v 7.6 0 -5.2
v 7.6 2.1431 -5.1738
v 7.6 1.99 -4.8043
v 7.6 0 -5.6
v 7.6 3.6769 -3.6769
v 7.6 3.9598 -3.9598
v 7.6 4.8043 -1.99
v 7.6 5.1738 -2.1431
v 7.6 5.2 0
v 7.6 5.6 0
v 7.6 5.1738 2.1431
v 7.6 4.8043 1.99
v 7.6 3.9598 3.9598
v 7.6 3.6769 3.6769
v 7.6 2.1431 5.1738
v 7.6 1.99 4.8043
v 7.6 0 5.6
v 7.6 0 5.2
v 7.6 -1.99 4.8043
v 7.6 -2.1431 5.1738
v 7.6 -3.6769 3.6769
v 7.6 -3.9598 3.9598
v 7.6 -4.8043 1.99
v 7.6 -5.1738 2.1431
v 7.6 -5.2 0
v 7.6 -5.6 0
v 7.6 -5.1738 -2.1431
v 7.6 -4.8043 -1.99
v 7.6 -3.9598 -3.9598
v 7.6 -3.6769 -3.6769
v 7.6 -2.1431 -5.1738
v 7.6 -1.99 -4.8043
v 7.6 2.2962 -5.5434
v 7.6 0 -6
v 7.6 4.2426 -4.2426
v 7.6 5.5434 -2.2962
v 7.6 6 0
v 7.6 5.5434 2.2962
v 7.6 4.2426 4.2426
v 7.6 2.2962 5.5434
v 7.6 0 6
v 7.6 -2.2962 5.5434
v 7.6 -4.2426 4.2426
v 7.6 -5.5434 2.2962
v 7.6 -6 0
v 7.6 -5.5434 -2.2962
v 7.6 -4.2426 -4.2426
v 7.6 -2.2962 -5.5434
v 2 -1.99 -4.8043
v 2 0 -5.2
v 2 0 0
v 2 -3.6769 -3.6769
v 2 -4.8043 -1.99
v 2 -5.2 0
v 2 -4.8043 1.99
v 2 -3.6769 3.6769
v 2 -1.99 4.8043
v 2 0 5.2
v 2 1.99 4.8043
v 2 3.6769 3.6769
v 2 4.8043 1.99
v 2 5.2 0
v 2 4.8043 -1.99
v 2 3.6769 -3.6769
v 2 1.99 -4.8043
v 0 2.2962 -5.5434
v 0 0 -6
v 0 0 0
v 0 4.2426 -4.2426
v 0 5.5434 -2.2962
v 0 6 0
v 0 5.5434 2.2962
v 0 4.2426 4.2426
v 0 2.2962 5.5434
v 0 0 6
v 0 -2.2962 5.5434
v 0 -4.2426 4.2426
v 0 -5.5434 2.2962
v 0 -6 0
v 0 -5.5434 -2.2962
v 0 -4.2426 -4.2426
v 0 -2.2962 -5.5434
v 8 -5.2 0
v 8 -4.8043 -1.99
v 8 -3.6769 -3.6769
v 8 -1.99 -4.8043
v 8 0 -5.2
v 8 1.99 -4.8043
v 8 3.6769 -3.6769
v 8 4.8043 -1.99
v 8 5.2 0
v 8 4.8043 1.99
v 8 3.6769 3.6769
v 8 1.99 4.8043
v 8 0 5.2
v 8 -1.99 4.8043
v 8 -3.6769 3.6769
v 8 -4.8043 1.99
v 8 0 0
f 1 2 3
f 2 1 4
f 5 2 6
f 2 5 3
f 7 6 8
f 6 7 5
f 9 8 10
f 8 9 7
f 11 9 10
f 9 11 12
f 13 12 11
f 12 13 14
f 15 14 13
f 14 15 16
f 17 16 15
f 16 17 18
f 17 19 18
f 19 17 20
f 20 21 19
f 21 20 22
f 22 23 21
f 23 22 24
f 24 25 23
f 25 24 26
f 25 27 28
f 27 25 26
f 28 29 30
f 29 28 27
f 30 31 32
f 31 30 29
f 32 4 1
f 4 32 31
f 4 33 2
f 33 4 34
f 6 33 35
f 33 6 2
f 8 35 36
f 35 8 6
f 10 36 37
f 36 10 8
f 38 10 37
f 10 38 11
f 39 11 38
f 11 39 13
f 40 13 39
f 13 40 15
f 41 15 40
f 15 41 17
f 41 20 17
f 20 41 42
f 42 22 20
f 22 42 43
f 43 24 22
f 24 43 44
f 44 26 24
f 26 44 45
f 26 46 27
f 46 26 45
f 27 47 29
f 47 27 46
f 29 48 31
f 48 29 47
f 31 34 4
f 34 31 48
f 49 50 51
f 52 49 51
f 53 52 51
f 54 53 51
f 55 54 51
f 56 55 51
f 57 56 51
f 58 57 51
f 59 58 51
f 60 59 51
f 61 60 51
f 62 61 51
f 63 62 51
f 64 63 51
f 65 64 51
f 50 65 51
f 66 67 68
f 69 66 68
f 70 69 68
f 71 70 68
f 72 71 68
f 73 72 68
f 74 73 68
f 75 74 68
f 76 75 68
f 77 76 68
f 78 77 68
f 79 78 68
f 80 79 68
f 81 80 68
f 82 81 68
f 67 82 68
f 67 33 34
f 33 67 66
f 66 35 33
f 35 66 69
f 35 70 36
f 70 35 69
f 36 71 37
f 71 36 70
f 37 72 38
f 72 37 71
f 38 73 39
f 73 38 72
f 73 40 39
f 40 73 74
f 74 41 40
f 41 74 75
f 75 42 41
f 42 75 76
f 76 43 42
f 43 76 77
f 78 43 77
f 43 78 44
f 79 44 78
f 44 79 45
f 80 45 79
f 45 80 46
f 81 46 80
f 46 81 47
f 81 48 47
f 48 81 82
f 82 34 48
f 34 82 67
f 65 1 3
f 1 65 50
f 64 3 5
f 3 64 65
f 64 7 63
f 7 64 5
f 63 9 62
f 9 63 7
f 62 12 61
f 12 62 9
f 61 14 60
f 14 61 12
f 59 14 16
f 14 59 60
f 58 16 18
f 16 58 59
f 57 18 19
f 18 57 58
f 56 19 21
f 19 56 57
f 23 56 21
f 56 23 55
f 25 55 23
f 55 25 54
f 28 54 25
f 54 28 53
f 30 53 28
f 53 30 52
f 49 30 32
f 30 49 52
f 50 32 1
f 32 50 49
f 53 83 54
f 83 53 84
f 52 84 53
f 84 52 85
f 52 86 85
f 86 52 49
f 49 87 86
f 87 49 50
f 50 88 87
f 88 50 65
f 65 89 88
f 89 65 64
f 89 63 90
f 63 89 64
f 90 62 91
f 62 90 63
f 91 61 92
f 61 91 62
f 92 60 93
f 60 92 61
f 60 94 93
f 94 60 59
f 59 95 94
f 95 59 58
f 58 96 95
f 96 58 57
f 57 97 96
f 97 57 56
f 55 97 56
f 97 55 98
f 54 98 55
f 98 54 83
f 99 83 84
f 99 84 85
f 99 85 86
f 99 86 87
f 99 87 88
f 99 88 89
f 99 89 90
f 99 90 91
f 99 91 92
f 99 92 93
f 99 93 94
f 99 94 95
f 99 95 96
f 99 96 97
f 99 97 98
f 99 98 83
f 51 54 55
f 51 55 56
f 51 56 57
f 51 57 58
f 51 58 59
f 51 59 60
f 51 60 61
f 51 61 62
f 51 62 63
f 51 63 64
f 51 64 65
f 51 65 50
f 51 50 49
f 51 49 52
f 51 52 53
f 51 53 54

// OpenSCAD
// file: ../../p/stud3.scad
use <../lib.scad>
use <4-4cyli.scad>
use <4-4disc.scad>
use <4-4edge.scad>
$fa=1; $fs=0.2;
function ldraw_lib__stud3(realsolid=false) = realsolid ? 
    [openscad(translate([0,0,-eps()], o=cylinder(4+eps(), r=4)),2)] : [
// 0 Stud Tube Solid
// 0 Name: stud3.dat
// 0 Author: James Jessiman
// 0 !LDRAW_ORG Primitive UPDATE 2012-01
// 0 !LICENSE Licensed under CC BY 2.0 and CC BY 4.0 : see CAreadme.txt
// 
// 0 BFC CERTIFY CCW
  [0,"BFC","CERTIFY"],
  [0,"BFC","CCW"],
// 
// 0 !HISTORY 2002-04-04 [sbliss] Modified for BFC compliance
// 0 !HISTORY 2002-04-25 [PTadmin] Official Update 2002-02
// 0 !HISTORY 2007-06-24 [PTadmin] Header formatted for Contributor Agreement
// 0 !HISTORY 2008-07-01 [PTadmin] Official Update 2008-01
// 0 !HISTORY 2012-02-16 [Philo] Changed to CCW
// 0 !HISTORY 2012-03-30 [PTadmin] Official Update 2012-01
// 
// 
// 1 16 0 -4 0 4 0 0 0 1 0 0 0 4 4-4edge.dat
  [1,16,0,-4,0,4,0,0,0,1,0,0,0,4, ldraw_lib__4_4edge(realsolid)],
// 1 16 0 0 0 4 0 0 0 1 0 0 0 4 4-4edge.dat
  [1,16,0,0,0,4,0,0,0,1,0,0,0,4, ldraw_lib__4_4edge(realsolid)],
// 1 16 0 -4 0 4 0 0 0 1 0 0 0 4 4-4disc.dat
  [1,16,0,-4,0,4,0,0,0,1,0,0,0,4, ldraw_lib__4_4disc(realsolid)],
// 1 16 0 -4 0 4 0 0 0 4 0 0 0 4 4-4cyli.dat
  [1,16,0,-4,0,4,0,0,0,4,0,0,0,4, ldraw_lib__4_4cyli(realsolid)],
];
module ldraw_lib__stud3(step=0, col=false, unit=2/5, alt=false, line=0.2, solid=!$preview)
    makepoly(ldraw_lib__stud3(solid), step=step, col=col, unit=unit, alt=alt, line=line, solid=solid);
ldraw_lib__stud3(line=0.2);
// file: ../../p/stud.scad
use <../lib.scad>
use <4-4cyli.scad>
use <4-4disc.scad>
use <4-4edge.scad>
$fa=1; $fs=0.2;
function ldraw_lib__stud(realsolid=false) = realsolid ? 
    [openscad(translate([0,0,-eps()], o=cylinder(4+eps(), r=6)),2)] : [
// 0 Stud
// 0 Name: stud.dat
// 0 Author: James Jessiman
// 0 !LDRAW_ORG Primitive UPDATE 2012-01
// 0 !LICENSE Licensed under CC BY 2.0 and CC BY 4.0 : see CAreadme.txt
// 
// 0 BFC CERTIFY CCW
  [0,"BFC","CERTIFY"],
  [0,"BFC","CCW"],
// 
// 0 !HISTORY 2002-04-04 [sbliss] Modified for BFC compliance
// 0 !HISTORY 2002-04-25 [PTadmin] Official Update 2002-02
// 0 !HISTORY 2007-06-24 [PTadmin] Header formatted for Contributor Agreement
// 0 !HISTORY 2008-07-01 [PTadmin] Official Update 2008-01
// 0 !HISTORY 2012-02-16 [Philo] Changed to CCW
// 0 !HISTORY 2012-03-30 [PTadmin] Official Update 2012-01
// 
// 
// 1 16 0 0 0 6 0 0 0 1 0 0 0 6 4-4edge.dat
  [1,16,0,0,0,6,0,0,0,1,0,0,0,6, ldraw_lib__4_4edge(realsolid)],
// 1 16 0 -4 0 6 0 0 0 1 0 0 0 6 4-4edge.dat
  [1,16,0,-4,0,6,0,0,0,1,0,0,0,6, ldraw_lib__4_4edge(realsolid)],
// 1 16 0 0 0 6 0 0 0 -4 0 0 0 6 4-4cyli.dat
  [1,16,0,0,0,6,0,0,0,-4,0,0,0,6, ldraw_lib__4_4cyli(realsolid)],
// 1 16 0 -4 0 6 0 0 0 1 0 0 0 6 4-4disc.dat
  [1,16,0,-4,0,6,0,0,0,1,0,0,0,6, ldraw_lib__4_4disc(realsolid)],
];
module ldraw_lib__stud(step=0, col=false, unit=2/5, alt=false, line=0.2, solid=!$preview)
    makepoly(ldraw_lib__stud(solid), step=step, col=col, unit=unit, alt=alt, line=line, solid=solid);
ldraw_lib__stud(line=0.2);
// file: ../../p/box5.scad
use <../lib.scad>
$fa=1; $fs=0.2;
function ldraw_lib__box5(realsolid=false) = [
// 0 Box with 5 Faces and All Edges
// 0 Name: box5.dat
// 0 Author: James Jessiman
// 0 !LDRAW_ORG Primitive UPDATE 2012-01
// 0 !LICENSE Licensed under CC BY 2.0 and CC BY 4.0 : see CAreadme.txt
// 
// 0 BFC CERTIFY CCW
  [0,"BFC","CERTIFY"],
  [0,"BFC","CCW"],
// 
// 0 !HISTORY 2002-04-03 [sbliss] Modified for BFC compliance
// 0 !HISTORY 2002-04-25 [PTadmin] Official Update 2002-02
// 0 !HISTORY 2007-06-24 [PTadmin] Header formatted for Contributor Agreement
// 0 !HISTORY 2008-07-01 [PTadmin] Official Update 2008-01
// 0 !HISTORY 2012-02-16 [Philo] Changed to CCW
// 0 !HISTORY 2012-03-30 [PTadmin] Official Update 2012-01
// 
// 
// 2 24 1 1 1 -1 1 1
  [2,24,1,1,1,-1,1,1],
// 2 24 -1 1 1 -1 1 -1
  [2,24,-1,1,1,-1,1,-1],
// 2 24 -1 1 -1 1 1 -1
  [2,24,-1,1,-1,1,1,-1],
// 2 24 1 1 -1 1 1 1
  [2,24,1,1,-1,1,1,1],
// 2 24 1 0 1 -1 0 1
  [2,24,1,0,1,-1,0,1],
// 2 24 -1 0 1 -1 0 -1
  [2,24,-1,0,1,-1,0,-1],
// 2 24 -1 0 -1 1 0 -1
  [2,24,-1,0,-1,1,0,-1],
// 2 24 1 0 -1 1 0 1
  [2,24,1,0,-1,1,0,1],
// 2 24 1 0 1 1 1 1
  [2,24,1,0,1,1,1,1],
// 2 24 -1 0 1 -1 1 1
  [2,24,-1,0,1,-1,1,1],
// 2 24 1 0 -1 1 1 -1
  [2,24,1,0,-1,1,1,-1],
// 2 24 -1 0 -1 -1 1 -1
  [2,24,-1,0,-1,-1,1,-1],
// 4 16 -1 1 1 1 1 1 1 1 -1 -1 1 -1
  [4,16,-1,1,1,1,1,1,1,1,-1,-1,1,-1],
// 4 16 -1 1 1 -1 0 1 1 0 1 1 1 1
  [4,16,-1,1,1,-1,0,1,1,0,1,1,1,1],
// 4 16 -1 1 -1 -1 0 -1 -1 0 1 -1 1 1
  [4,16,-1,1,-1,-1,0,-1,-1,0,1,-1,1,1],
// 4 16 1 1 -1 1 0 -1 -1 0 -1 -1 1 -1
  [4,16,1,1,-1,1,0,-1,-1,0,-1,-1,1,-1],
// 4 16 1 1 1 1 0 1 1 0 -1 1 1 -1
  [4,16,1,1,1,1,0,1,1,0,-1,1,1,-1],
];
module ldraw_lib__box5(step=0, col=false, unit=2/5, alt=false, line=0.2, solid=!$preview)
    makepoly(ldraw_lib__box5(solid), step=step, col=col, unit=unit, alt=alt, line=line, solid=solid);
ldraw_lib__box5(line=0.2);
// file: ../../p/box4t.scad
use <../lib.scad>
$fa=1; $fs=0.2;
function ldraw_lib__box4t(realsolid=false) = [
// 0 Box with 4 Adjacent Faces and All Edges
// 0 Name: box4t.dat
// 0 Author: Tore Eriksson [Tore_Eriksson]
// 0 !LDRAW_ORG Primitive UPDATE 2003-02
// 0 !LICENSE Licensed under CC BY 2.0 and CC BY 4.0 : see CAreadme.txt
// 
// 0 BFC CERTIFY CCW
  [0,"BFC","CERTIFY"],
  [0,"BFC","CCW"],
// 
// 0 !HISTORY 1997-09-29 [PTadmin] Official Update 1997-15
// 0 !HISTORY 2002-08-31 [izanette] Modified with WINDZ for BFC compliance
// 0 !HISTORY 2003-08-01 [PTadmin] Official Update 2003-02
// 0 !HISTORY 2007-06-24 [PTadmin] Header formatted for Contributor Agreement
// 0 !HISTORY 2008-07-01 [PTadmin] Official Update 2008-01
// 
// 
// 2 24 1 1 1 -1 1 1
  [2,24,1,1,1,-1,1,1],
// 2 24 -1 1 1 -1 1 -1
  [2,24,-1,1,1,-1,1,-1],
// 2 24 -1 1 -1 1 1 -1
  [2,24,-1,1,-1,1,1,-1],
// 2 24 1 1 -1 1 1 1
  [2,24,1,1,-1,1,1,1],
// 2 24 1 0 1 -1 0 1
  [2,24,1,0,1,-1,0,1],
// 2 24 -1 0 1 -1 0 -1
  [2,24,-1,0,1,-1,0,-1],
// 2 24 -1 0 -1 1 0 -1
  [2,24,-1,0,-1,1,0,-1],
// 2 24 1 0 -1 1 0 1
  [2,24,1,0,-1,1,0,1],
// 2 24 1 0 1 1 1 1
  [2,24,1,0,1,1,1,1],
// 2 24 -1 0 1 -1 1 1
  [2,24,-1,0,1,-1,1,1],
// 2 24 1 0 -1 1 1 -1
  [2,24,1,0,-1,1,1,-1],
// 2 24 -1 0 -1 -1 1 -1
  [2,24,-1,0,-1,-1,1,-1],
// 4 16 1 1 1 1 1 -1 -1 1 -1 -1 1 1
  [4,16,1,1,1,1,1,-1,-1,1,-1,-1,1,1],
// 4 16 1 1 1 -1 1 1 -1 0 1 1 0 1
  [4,16,1,1,1,-1,1,1,-1,0,1,1,0,1],
// 4 16 -1 1 1 -1 1 -1 -1 0 -1 -1 0 1
  [4,16,-1,1,1,-1,1,-1,-1,0,-1,-1,0,1],
// 0 4 16 -1 1 -1 -1 0 -1 1 0 -1 1 1 -1
// 4 16 1 1 -1 1 1 1 1 0 1 1 0 -1
  [4,16,1,1,-1,1,1,1,1,0,1,1,0,-1],
// 0
];
module ldraw_lib__box4t(step=0, col=false, unit=2/5, alt=false, line=0.2, solid=!$preview)
    makepoly(ldraw_lib__box4t(solid), step=step, col=col, unit=unit, alt=alt, line=line, solid=solid);
ldraw_lib__box4t(line=0.2);
// file: 3004s01.scad
use <../../lib.scad>
use <../../p/box4t.scad>
use <../../p/box5.scad>
use <../../p/stud.scad>
use <../../p/stud3.scad>
$fa=1; $fs=0.2;
function ldraw_lib__s__3004s01(realsolid=false) = [
// 0 ~Brick  1 x  2 without Front Face
// 0 Name: s\3004s01.dat
// 0 Author: James Jessiman
// 0 !LDRAW_ORG Subpart UPDATE 2003-03
// 0 !LICENSE Licensed under CC BY 2.0 and CC BY 4.0 : see CAreadme.txt
// 
// 0 BFC CERTIFY CCW
  [0,"BFC","CERTIFY"],
  [0,"BFC","CCW"],
// 
// 0 !HISTORY 2003-09-07 [jriley] Subfiling, BFC
// 0 !HISTORY 2003-12-19 [PTadmin] Official Update 2003-03
// 0 !HISTORY 2007-08-29 [PTadmin] Header formatted for Contributor Agreement
// 0 !HISTORY 2008-07-01 [PTadmin] Official Update 2008-01
// 
// 
// 1 16 0 4 0 1 0 0 0 -5 0 0 0 1 stud3.dat
  [1,16,0,4,0,1,0,0,0,-5,0,0,0,1, ldraw_lib__stud3(realsolid)],
// 0 BFC INVERTNEXT
  [0,"BFC","INVERTNEXT"],
// 1 16 0 24 0 16 0 0 0 -20 0 0 0 6 box5.dat
  [1,16,0,24,0,16,0,0,0,-20,0,0,0,6, ldraw_lib__box5(realsolid)],
// 4 16 20 24 10 16 24 6 -16 24 6 -20 24 10
  [4,16,20,24,10,16,24,6,-16,24,6,-20,24,10],
// 4 16 -20 24 10 -16 24 6 -16 24 -6 -20 24 -10
  [4,16,-20,24,10,-16,24,6,-16,24,-6,-20,24,-10],
// 4 16 -20 24 -10 -16 24 -6 16 24 -6 20 24 -10
  [4,16,-20,24,-10,-16,24,-6,16,24,-6,20,24,-10],
// 4 16 20 24 -10 16 24 -6 16 24 6 20 24 10
  [4,16,20,24,-10,16,24,-6,16,24,6,20,24,10],
// 1 16 0 24 0 20 0 0 0 -24 0 0 0 10 box4t.dat
  [1,16,0,24,0,20,0,0,0,-24,0,0,0,10, ldraw_lib__box4t(realsolid)],
// 1 16 10 0 0 1 0 0 0 1 0 0 0 1 stud.dat
  [1,16,10,0,0,1,0,0,0,1,0,0,0,1, ldraw_lib__stud(realsolid)],
// 1 16 -10 0 0 1 0 0 0 1 0 0 0 1 stud.dat
  [1,16,-10,0,0,1,0,0,0,1,0,0,0,1, ldraw_lib__stud(realsolid)],
// 0
];
module ldraw_lib__s__3004s01(step=0, col=false, unit=2/5, alt=false, line=0.2, solid=!$preview)
    makepoly(ldraw_lib__s__3004s01(solid), step=step, col=col, unit=unit, alt=alt, line=line, solid=solid);
ldraw_lib__s__3004s01(line=0.2);
// file: ../u9044.scad
use <../lib.scad>
use <../p/4-4cyli.scad>
use <../p/4-4disc.scad>
use <../p/4-4edge.scad>
$fa=1; $fs=0.2;
function ldraw_lib__u9044(realsolid=false) = [
// 0 ~Magnet Cylindrical  1.3 x  1.3
// 0 Name: u9044.dat
// 0 Author: Chris Dee [cwdee]
// 0 !LDRAW_ORG Part UPDATE 2012-01
// 0 !LICENSE Licensed under CC BY 2.0 and CC BY 4.0 : see CAreadme.txt
// 
// 0 BFC CERTIFY CW
  [0,"BFC","CERTIFY"],
  [0,"BFC","CW"],
// 
// 0 !CMDLINE -c493
// 
// 0 !HISTORY 2011-12-18 [Steffen] added cmdline for new magnet material 493
// 0 !HISTORY 2012-03-30 [PTadmin] Official Update 2012-01
// 
// 
// 1 16 0 0 -7.5 13 0 0 0 0 13 0 15 0 4-4cyli.dat
  [1,16,0,0,-7.5,13,0,0,0,0,13,0,15,0, ldraw_lib__4_4cyli(realsolid)],
// 1 16 0 0 7.5 13 0 0 0 0 13 0 1 0 4-4edge.dat
  [1,16,0,0,7.5,13,0,0,0,0,13,0,1,0, ldraw_lib__4_4edge(realsolid)],
// 1 16 0 0 7.5 13 0 0 0 0 13 0 -1 0 4-4disc.dat
  [1,16,0,0,7.5,13,0,0,0,0,13,0,-1,0, ldraw_lib__4_4disc(realsolid)],
// 1 16 0 0 -7.5 13 0 0 0 0 -13 0 1 0 4-4edge.dat
  [1,16,0,0,-7.5,13,0,0,0,0,-13,0,1,0, ldraw_lib__4_4edge(realsolid)],
// 1 16 0 0 -7.5 13 0 0 0 0 -13 0 1 0 4-4disc.dat
  [1,16,0,0,-7.5,13,0,0,0,0,-13,0,1,0, ldraw_lib__4_4disc(realsolid)],
];
module ldraw_lib__u9044(step=0, col=false, unit=2/5, alt=false, line=0.2, solid=!$preview)
    makepoly(ldraw_lib__u9044(solid), step=step, col=col, unit=unit, alt=alt, line=line, solid=solid);
ldraw_lib__u9044(line=0.2);
// file: ../../p/4-4rin14.scad
use <../lib.scad>
$fa=1; $fs=0.2;
function ldraw_lib__4_4rin14(realsolid=false) = [
// 0 Ring 14 x 1.0
// 0 Name: 4-4rin14.dat
// 0 Author: John Riley [jriley]
// 0 !LDRAW_ORG Primitive UPDATE 2003-03
// 0 !LICENSE Licensed under CC BY 2.0 and CC BY 4.0 : see CAreadme.txt
// 
// 0 BFC CERTIFY CCW
  [0,"BFC","CERTIFY"],
  [0,"BFC","CCW"],
// 
// 0 !HISTORY 2003-12-19 [PTadmin] Official Update 2003-03
// 0 !HISTORY 2007-06-24 [PTadmin] Header formatted for Contributor Agreement
// 0 !HISTORY 2008-07-01 [PTadmin] Official Update 2008-01
// 
// 
// 4 16 14 0 0 15 0 0 13.8585 0 5.7405 12.9346 0 5.3578
  [4,16,14,0,0,15,0,0,13.8585,0,5.7405,12.9346,0,5.3578],
// 4 16 12.9346 0 5.3578 13.8585 0 5.7405 10.6065 0 10.6065 9.8994 0 9.8994
  [4,16,12.9346,0,5.3578,13.8585,0,5.7405,10.6065,0,10.6065,9.8994,0,9.8994],
// 4 16 9.8994 0 9.8994 10.6065 0 10.6065 5.7405 0 13.8585 5.3578 0 12.9346
  [4,16,9.8994,0,9.8994,10.6065,0,10.6065,5.7405,0,13.8585,5.3578,0,12.9346],
// 4 16 5.3578 0 12.9346 5.7405 0 13.8585 0 0 15 0 0 14
  [4,16,5.3578,0,12.9346,5.7405,0,13.8585,0,0,15,0,0,14],
// 4 16 0 0 14 0 0 15 -5.7405 0 13.8585 -5.3578 0 12.9346
  [4,16,0,0,14,0,0,15,-5.7405,0,13.8585,-5.3578,0,12.9346],
// 4 16 -5.3578 0 12.9346 -5.7405 0 13.8585 -10.6065 0 10.6065 -9.8994 0 9.8994
  [4,16,-5.3578,0,12.9346,-5.7405,0,13.8585,-10.6065,0,10.6065,-9.8994,0,9.8994],
// 4 16 -9.8994 0 9.8994 -10.6065 0 10.6065 -13.8585 0 5.7405 -12.9346 0 5.3578
  [4,16,-9.8994,0,9.8994,-10.6065,0,10.6065,-13.8585,0,5.7405,-12.9346,0,5.3578],
// 4 16 -12.9346 0 5.3578 -13.8585 0 5.7405 -15 0 0 -14 0 0
  [4,16,-12.9346,0,5.3578,-13.8585,0,5.7405,-15,0,0,-14,0,0],
// 4 16 -14 0 0 -15 0 0 -13.8585 0 -5.7405 -12.9346 0 -5.3578
  [4,16,-14,0,0,-15,0,0,-13.8585,0,-5.7405,-12.9346,0,-5.3578],
// 4 16 -12.9346 0 -5.3578 -13.8585 0 -5.7405 -10.6065 0 -10.6065 -9.8994 0 -9.8994
  [4,16,-12.9346,0,-5.3578,-13.8585,0,-5.7405,-10.6065,0,-10.6065,-9.8994,0,-9.8994],
// 4 16 -9.8994 0 -9.8994 -10.6065 0 -10.6065 -5.7405 0 -13.8585 -5.3578 0 -12.9346
  [4,16,-9.8994,0,-9.8994,-10.6065,0,-10.6065,-5.7405,0,-13.8585,-5.3578,0,-12.9346],
// 4 16 -5.3578 0 -12.9346 -5.7405 0 -13.8585 0 0 -15 0 0 -14
  [4,16,-5.3578,0,-12.9346,-5.7405,0,-13.8585,0,0,-15,0,0,-14],
// 4 16 0 0 -14 0 0 -15 5.7405 0 -13.8585 5.3578 0 -12.9346
  [4,16,0,0,-14,0,0,-15,5.7405,0,-13.8585,5.3578,0,-12.9346],
// 4 16 5.3578 0 -12.9346 5.7405 0 -13.8585 10.6065 0 -10.6065 9.8994 0 -9.8994
  [4,16,5.3578,0,-12.9346,5.7405,0,-13.8585,10.6065,0,-10.6065,9.8994,0,-9.8994],
// 4 16 9.8994 0 -9.8994 10.6065 0 -10.6065 13.8585 0 -5.7405 12.9346 0 -5.3578
  [4,16,9.8994,0,-9.8994,10.6065,0,-10.6065,13.8585,0,-5.7405,12.9346,0,-5.3578],
// 4 16 12.9346 0 -5.3578 13.8585 0 -5.7405 15 0 0 14 0 0
  [4,16,12.9346,0,-5.3578,13.8585,0,-5.7405,15,0,0,14,0,0],
// 0
// 
];
module ldraw_lib__4_4rin14(step=0, col=false, unit=2/5, alt=false, line=0.2, solid=!$preview)
    makepoly(ldraw_lib__4_4rin14(solid), step=step, col=col, unit=unit, alt=alt, line=line, solid=solid);
ldraw_lib__4_4rin14(line=0.2);
// file: ../../p/4-4rin13.scad
use <../lib.scad>
$fa=1; $fs=0.2;
function ldraw_lib__4_4rin13(realsolid=false) = [
// 0 Ring 13 x 1.0
// 0 Name: 4-4rin13.dat
// 0 Author: John Riley [jriley]
// 0 !LDRAW_ORG Primitive UPDATE 2003-03
// 0 !LICENSE Licensed under CC BY 2.0 and CC BY 4.0 : see CAreadme.txt
// 
// 0 BFC CERTIFY CCW
  [0,"BFC","CERTIFY"],
  [0,"BFC","CCW"],
// 
// 0 !HISTORY 2003-12-19 [PTadmin] Official Update 2003-03
// 0 !HISTORY 2007-06-24 [PTadmin] Header formatted for Contributor Agreement
// 0 !HISTORY 2008-07-01 [PTadmin] Official Update 2008-01
// 
// 
// 4 16 13 0 0 14 0 0 12.9346 0 5.3578 12.0107 0 4.9751
  [4,16,13,0,0,14,0,0,12.9346,0,5.3578,12.0107,0,4.9751],
// 4 16 12.0107 0 4.9751 12.9346 0 5.3578 9.8994 0 9.8994 9.1923 0 9.1923
  [4,16,12.0107,0,4.9751,12.9346,0,5.3578,9.8994,0,9.8994,9.1923,0,9.1923],
// 4 16 9.1923 0 9.1923 9.8994 0 9.8994 5.3578 0 12.9346 4.9751 0 12.0107
  [4,16,9.1923,0,9.1923,9.8994,0,9.8994,5.3578,0,12.9346,4.9751,0,12.0107],
// 4 16 4.9751 0 12.0107 5.3578 0 12.9346 0 0 14 0 0 13
  [4,16,4.9751,0,12.0107,5.3578,0,12.9346,0,0,14,0,0,13],
// 4 16 0 0 13 0 0 14 -5.3578 0 12.9346 -4.9751 0 12.0107
  [4,16,0,0,13,0,0,14,-5.3578,0,12.9346,-4.9751,0,12.0107],
// 4 16 -4.9751 0 12.0107 -5.3578 0 12.9346 -9.8994 0 9.8994 -9.1923 0 9.1923
  [4,16,-4.9751,0,12.0107,-5.3578,0,12.9346,-9.8994,0,9.8994,-9.1923,0,9.1923],
// 4 16 -9.1923 0 9.1923 -9.8994 0 9.8994 -12.9346 0 5.3578 -12.0107 0 4.9751
  [4,16,-9.1923,0,9.1923,-9.8994,0,9.8994,-12.9346,0,5.3578,-12.0107,0,4.9751],
// 4 16 -12.0107 0 4.9751 -12.9346 0 5.3578 -14 0 0 -13 0 0
  [4,16,-12.0107,0,4.9751,-12.9346,0,5.3578,-14,0,0,-13,0,0],
// 4 16 -13 0 0 -14 0 0 -12.9346 0 -5.3578 -12.0107 0 -4.9751
  [4,16,-13,0,0,-14,0,0,-12.9346,0,-5.3578,-12.0107,0,-4.9751],
// 4 16 -12.0107 0 -4.9751 -12.9346 0 -5.3578 -9.8994 0 -9.8994 -9.1923 0 -9.1923
  [4,16,-12.0107,0,-4.9751,-12.9346,0,-5.3578,-9.8994,0,-9.8994,-9.1923,0,-9.1923],
// 4 16 -9.1923 0 -9.1923 -9.8994 0 -9.8994 -5.3578 0 -12.9346 -4.9751 0 -12.0107
  [4,16,-9.1923,0,-9.1923,-9.8994,0,-9.8994,-5.3578,0,-12.9346,-4.9751,0,-12.0107],
// 4 16 -4.9751 0 -12.0107 -5.3578 0 -12.9346 0 0 -14 0 0 -13
  [4,16,-4.9751,0,-12.0107,-5.3578,0,-12.9346,0,0,-14,0,0,-13],
// 4 16 0 0 -13 0 0 -14 5.3578 0 -12.9346 4.9751 0 -12.0107
  [4,16,0,0,-13,0,0,-14,5.3578,0,-12.9346,4.9751,0,-12.0107],
// 4 16 4.9751 0 -12.0107 5.3578 0 -12.9346 9.8994 0 -9.8994 9.1923 0 -9.1923
  [4,16,4.9751,0,-12.0107,5.3578,0,-12.9346,9.8994,0,-9.8994,9.1923,0,-9.1923],
// 4 16 9.1923 0 -9.1923 9.8994 0 -9.8994 12.9346 0 -5.3578 12.0107 0 -4.9751
  [4,16,9.1923,0,-9.1923,9.8994,0,-9.8994,12.9346,0,-5.3578,12.0107,0,-4.9751],
// 4 16 12.0107 0 -4.9751 12.9346 0 -5.3578 14 0 0 13 0 0
  [4,16,12.0107,0,-4.9751,12.9346,0,-5.3578,14,0,0,13,0,0],
// 0
// 
];
module ldraw_lib__4_4rin13(step=0, col=false, unit=2/5, alt=false, line=0.2, solid=!$preview)
    makepoly(ldraw_lib__4_4rin13(solid), step=step, col=col, unit=unit, alt=alt, line=line, solid=solid);
ldraw_lib__4_4rin13(line=0.2);
// file: ../../p/4-4edge.scad
use <../lib.scad>
$fa=1; $fs=0.2;
function ldraw_lib__4_4edge(realsolid=false) = [
// 0 Circle 1.0
// 0 Name: 4-4edge.dat
// 0 Author: James Jessiman
// 0 !LDRAW_ORG Primitive UPDATE 2017-01
// 0 !LICENSE Licensed under CC BY 2.0 and CC BY 4.0 : see CAreadme.txt
// 
// 0 BFC CERTIFY CCW
  [0,"BFC","CERTIFY"],
  [0,"BFC","CCW"],
// 
// 0 !HISTORY 1998-12-15 [PTadmin] Official Update 1998-10
// 0 !HISTORY 2005-12-28 [PTadmin] Official Update 2005-01
// 0 !HISTORY 2007-06-24 [PTadmin] Header formatted for Contributor Agreement
// 0 !HISTORY 2008-07-01 [PTadmin] Official Update 2008-01
// 0 !HISTORY 2017-01-15 [Steffen] BFCed
// 0 !HISTORY 2017-12-30 [PTadmin] Official Update 2017-01
// 
// 
// 2 24 1 0 0 0.9239 0 0.3827
  [2,24,1,0,0,0.9239,0,0.3827],
// 2 24 0.9239 0 0.3827 0.7071 0 0.7071
  [2,24,0.9239,0,0.3827,0.7071,0,0.7071],
// 2 24 0.7071 0 0.7071 0.3827 0 0.9239
  [2,24,0.7071,0,0.7071,0.3827,0,0.9239],
// 2 24 0.3827 0 0.9239 0 0 1
  [2,24,0.3827,0,0.9239,0,0,1],
// 2 24 0 0 1 -0.3827 0 0.9239
  [2,24,0,0,1,-0.3827,0,0.9239],
// 2 24 -0.3827 0 0.9239 -0.7071 0 0.7071
  [2,24,-0.3827,0,0.9239,-0.7071,0,0.7071],
// 2 24 -0.7071 0 0.7071 -0.9239 0 0.3827
  [2,24,-0.7071,0,0.7071,-0.9239,0,0.3827],
// 2 24 -0.9239 0 0.3827 -1 0 -0
  [2,24,-0.9239,0,0.3827,-1,0,-0],
// 2 24 -1 0 -0 -0.9239 0 -0.3827
  [2,24,-1,0,-0,-0.9239,0,-0.3827],
// 2 24 -0.9239 0 -0.3827 -0.7071 0 -0.7071
  [2,24,-0.9239,0,-0.3827,-0.7071,0,-0.7071],
// 2 24 -0.7071 0 -0.7071 -0.3827 0 -0.9239
  [2,24,-0.7071,0,-0.7071,-0.3827,0,-0.9239],
// 2 24 -0.3827 0 -0.9239 0 0 -1
  [2,24,-0.3827,0,-0.9239,0,0,-1],
// 2 24 0 0 -1 0.3827 0 -0.9239
  [2,24,0,0,-1,0.3827,0,-0.9239],
// 2 24 0.3827 0 -0.9239 0.7071 0 -0.7071
  [2,24,0.3827,0,-0.9239,0.7071,0,-0.7071],
// 2 24 0.7071 0 -0.7071 0.9239 0 -0.3827
  [2,24,0.7071,0,-0.7071,0.9239,0,-0.3827],
// 2 24 0.9239 0 -0.3827 1 0 0
  [2,24,0.9239,0,-0.3827,1,0,0],
];
module ldraw_lib__4_4edge(step=0, col=false, unit=2/5, alt=false, line=0.2, solid=!$preview)
    makepoly(ldraw_lib__4_4edge(solid), step=step, col=col, unit=unit, alt=alt, line=line, solid=solid);
ldraw_lib__4_4edge(line=0.2);
// file: ../../p/4-4disc.scad
use <../lib.scad>
$fa=1; $fs=0.2;
function ldraw_lib__4_4disc(realsolid=false) = [
// 0 Disc 1.0
// 0 Name: 4-4disc.dat
// 0 Author: James Jessiman
// 0 !LDRAW_ORG Primitive UPDATE 2002-02
// 0 !LICENSE Licensed under CC BY 2.0 and CC BY 4.0 : see CAreadme.txt
// 
// 0 BFC CERTIFY CCW
  [0,"BFC","CERTIFY"],
  [0,"BFC","CCW"],
// 
// 0 !HISTORY 1998-12-15 [PTadmin] Official Update 1998-10
// 0 !HISTORY 2002-03-23 [sbliss] Added BFC statement
// 0 !HISTORY 2002-04-25 [PTadmin] Official Update 2002-02
// 0 !HISTORY 2007-06-24 [PTadmin] Header formatted for Contributor Agreement
// 0 !HISTORY 2008-07-01 [PTadmin] Official Update 2008-01
// 
// 
// 3 16 0 0 0 1 0 0 0.9239 0 0.3827
  [3,16,0,0,0,1,0,0,0.9239,0,0.3827],
// 3 16 0 0 0 0.9239 0 0.3827 0.7071 0 0.7071
  [3,16,0,0,0,0.9239,0,0.3827,0.7071,0,0.7071],
// 3 16 0 0 0 0.7071 0 0.7071 0.3827 0 0.9239
  [3,16,0,0,0,0.7071,0,0.7071,0.3827,0,0.9239],
// 3 16 0 0 0 0.3827 0 0.9239 0 0 1
  [3,16,0,0,0,0.3827,0,0.9239,0,0,1],
// 3 16 0 0 0 0 0 1 -0.3827 0 0.9239
  [3,16,0,0,0,0,0,1,-0.3827,0,0.9239],
// 3 16 0 0 0 -0.3827 0 0.9239 -0.7071 0 0.7071
  [3,16,0,0,0,-0.3827,0,0.9239,-0.7071,0,0.7071],
// 3 16 0 0 0 -0.7071 0 0.7071 -0.9239 0 0.3827
  [3,16,0,0,0,-0.7071,0,0.7071,-0.9239,0,0.3827],
// 3 16 0 0 0 -0.9239 0 0.3827 -1 0 -0
  [3,16,0,0,0,-0.9239,0,0.3827,-1,0,-0],
// 3 16 0 0 0 -1 0 -0 -0.9239 0 -0.3827
  [3,16,0,0,0,-1,0,-0,-0.9239,0,-0.3827],
// 3 16 0 0 0 -0.9239 0 -0.3827 -0.7071 0 -0.7071
  [3,16,0,0,0,-0.9239,0,-0.3827,-0.7071,0,-0.7071],
// 3 16 0 0 0 -0.7071 0 -0.7071 -0.3827 0 -0.9239
  [3,16,0,0,0,-0.7071,0,-0.7071,-0.3827,0,-0.9239],
// 3 16 0 0 0 -0.3827 0 -0.9239 0 0 -1
  [3,16,0,0,0,-0.3827,0,-0.9239,0,0,-1],
// 3 16 0 0 0 0 0 -1 0.3827 0 -0.9239
  [3,16,0,0,0,0,0,-1,0.3827,0,-0.9239],
// 3 16 0 0 0 0.3827 0 -0.9239 0.7071 0 -0.7071
  [3,16,0,0,0,0.3827,0,-0.9239,0.7071,0,-0.7071],
// 3 16 0 0 0 0.7071 0 -0.7071 0.9239 0 -0.3827
  [3,16,0,0,0,0.7071,0,-0.7071,0.9239,0,-0.3827],
// 3 16 0 0 0 0.9239 0 -0.3827 1 0 0
  [3,16,0,0,0,0.9239,0,-0.3827,1,0,0],
// 0
];
module ldraw_lib__4_4disc(step=0, col=false, unit=2/5, alt=false, line=0.2, solid=!$preview)
    makepoly(ldraw_lib__4_4disc(solid), step=step, col=col, unit=unit, alt=alt, line=line, solid=solid);
ldraw_lib__4_4disc(line=0.2);
// file: ../../p/4-4cyli.scad
use <../lib.scad>
$fa=1; $fs=0.2;
function ldraw_lib__4_4cyli(realsolid=false) = [
// 0 Cylinder 1.0
// 0 Name: 4-4cyli.dat
// 0 Author: James Jessiman
// 0 !LDRAW_ORG Primitive UPDATE 2005-01
// 0 !LICENSE Licensed under CC BY 2.0 and CC BY 4.0 : see CAreadme.txt
// 
// 0 BFC CERTIFY CCW
  [0,"BFC","CERTIFY"],
  [0,"BFC","CCW"],
// 
// 0 !HISTORY 1998-12-15 [PTadmin] Official Update 1998-10
// 0 !HISTORY 2002-03-23 [sbliss] Added BFC statement; merged headers from files in distributions LDraw 0.27 and Complete.
// 0 !HISTORY 2002-04-25 [PTadmin] Official Update 2002-02
// 0 !HISTORY 2004-12-14 [guyvivan] BFC CCW
// 0 !HISTORY 2005-12-28 [PTadmin] Official Update 2005-01
// 0 !HISTORY 2007-06-24 [PTadmin] Header formatted for Contributor Agreement
// 0 !HISTORY 2008-07-01 [PTadmin] Official Update 2008-01
// 
// 
// 4 16 1 1 0 0.9239 1 0.3827 0.9239 0 0.3827 1 0 0
  [4,16,1,1,0,0.9239,1,0.3827,0.9239,0,0.3827,1,0,0],
// 5 24 1 0 0 1 1 0 0.9239 0 0.3827 0.9239 0 -0.3827
  [5,24,1,0,0,1,1,0,0.9239,0,0.3827,0.9239,0,-0.3827],
// 4 16 0.9239 1 0.3827 0.7071 1 0.7071 0.7071 0 0.7071 0.9239 0 0.3827
  [4,16,0.9239,1,0.3827,0.7071,1,0.7071,0.7071,0,0.7071,0.9239,0,0.3827],
// 5 24 0.9239 0 0.3827 0.9239 1 0.3827 0.7071 0 0.7071 1 0 0
  [5,24,0.9239,0,0.3827,0.9239,1,0.3827,0.7071,0,0.7071,1,0,0],
// 4 16 0.7071 1 0.7071 0.3827 1 0.9239 0.3827 0 0.9239 0.7071 0 0.7071
  [4,16,0.7071,1,0.7071,0.3827,1,0.9239,0.3827,0,0.9239,0.7071,0,0.7071],
// 5 24 0.7071 0 0.7071 0.7071 1 0.7071 0.3827 0 0.9239 0.9239 0 0.3827
  [5,24,0.7071,0,0.7071,0.7071,1,0.7071,0.3827,0,0.9239,0.9239,0,0.3827],
// 4 16 0.3827 1 0.9239 0 1 1 0 0 1 0.3827 0 0.9239
  [4,16,0.3827,1,0.9239,0,1,1,0,0,1,0.3827,0,0.9239],
// 5 24 0.3827 0 0.9239 0.3827 1 0.9239 0 0 1 0.7071 0 0.7071
  [5,24,0.3827,0,0.9239,0.3827,1,0.9239,0,0,1,0.7071,0,0.7071],
// 4 16 0 1 1 -0.3827 1 0.9239 -0.3827 0 0.9239 0 0 1
  [4,16,0,1,1,-0.3827,1,0.9239,-0.3827,0,0.9239,0,0,1],
// 5 24 0 0 1 0 1 1 -0.3827 0 0.9239 0.3827 0 0.9239
  [5,24,0,0,1,0,1,1,-0.3827,0,0.9239,0.3827,0,0.9239],
// 4 16 -0.3827 1 0.9239 -0.7071 1 0.7071 -0.7071 0 0.7071 -0.3827 0 0.9239
  [4,16,-0.3827,1,0.9239,-0.7071,1,0.7071,-0.7071,0,0.7071,-0.3827,0,0.9239],
// 5 24 -0.3827 0 0.9239 -0.3827 1 0.9239 -0.7071 0 0.7071 0 0 1
  [5,24,-0.3827,0,0.9239,-0.3827,1,0.9239,-0.7071,0,0.7071,0,0,1],
// 4 16 -0.7071 1 0.7071 -0.9239 1 0.3827 -0.9239 0 0.3827 -0.7071 0 0.7071
  [4,16,-0.7071,1,0.7071,-0.9239,1,0.3827,-0.9239,0,0.3827,-0.7071,0,0.7071],
// 5 24 -0.7071 0 0.7071 -0.7071 1 0.7071 -0.9239 0 0.3827 -0.3827 0 0.9239
  [5,24,-0.7071,0,0.7071,-0.7071,1,0.7071,-0.9239,0,0.3827,-0.3827,0,0.9239],
// 4 16 -0.9239 1 0.3827 -1 1 0 -1 0 0 -0.9239 0 0.3827
  [4,16,-0.9239,1,0.3827,-1,1,0,-1,0,0,-0.9239,0,0.3827],
// 5 24 -0.9239 0 0.3827 -0.9239 1 0.3827 -1 0 0 -0.7071 0 0.7071
  [5,24,-0.9239,0,0.3827,-0.9239,1,0.3827,-1,0,0,-0.7071,0,0.7071],
// 4 16 -1 1 0 -0.9239 1 -0.3827 -0.9239 0 -0.3827 -1 0 0
  [4,16,-1,1,0,-0.9239,1,-0.3827,-0.9239,0,-0.3827,-1,0,0],
// 5 24 -1 0 0 -1 1 0 -0.9239 0 -0.3827 -0.9239 0 0.3827
  [5,24,-1,0,0,-1,1,0,-0.9239,0,-0.3827,-0.9239,0,0.3827],
// 4 16 -0.9239 1 -0.3827 -0.7071 1 -0.7071 -0.7071 0 -0.7071 -0.9239 0 -0.3827
  [4,16,-0.9239,1,-0.3827,-0.7071,1,-0.7071,-0.7071,0,-0.7071,-0.9239,0,-0.3827],
// 5 24 -0.9239 0 -0.3827 -0.9239 1 -0.3827 -0.7071 0 -0.7071 -1 0 0
  [5,24,-0.9239,0,-0.3827,-0.9239,1,-0.3827,-0.7071,0,-0.7071,-1,0,0],
// 4 16 -0.7071 1 -0.7071 -0.3827 1 -0.9239 -0.3827 0 -0.9239 -0.7071 0 -0.7071
  [4,16,-0.7071,1,-0.7071,-0.3827,1,-0.9239,-0.3827,0,-0.9239,-0.7071,0,-0.7071],
// 5 24 -0.7071 0 -0.7071 -0.7071 1 -0.7071 -0.3827 0 -0.9239 -0.9239 0 -0.3827
  [5,24,-0.7071,0,-0.7071,-0.7071,1,-0.7071,-0.3827,0,-0.9239,-0.9239,0,-0.3827],
// 4 16 -0.3827 1 -0.9239 0 1 -1 0 0 -1 -0.3827 0 -0.9239
  [4,16,-0.3827,1,-0.9239,0,1,-1,0,0,-1,-0.3827,0,-0.9239],
// 5 24 -0.3827 0 -0.9239 -0.3827 1 -0.9239 0 0 -1 -0.7071 0 -0.7071
  [5,24,-0.3827,0,-0.9239,-0.3827,1,-0.9239,0,0,-1,-0.7071,0,-0.7071],
// 4 16 0 1 -1 0.3827 1 -0.9239 0.3827 0 -0.9239 0 0 -1
  [4,16,0,1,-1,0.3827,1,-0.9239,0.3827,0,-0.9239,0,0,-1],
// 5 24 0 0 -1 0 1 -1 0.3827 0 -0.9239 -0.3827 0 -0.9239
  [5,24,0,0,-1,0,1,-1,0.3827,0,-0.9239,-0.3827,0,-0.9239],
// 4 16 0.3827 1 -0.9239 0.7071 1 -0.7071 0.7071 0 -0.7071 0.3827 0 -0.9239
  [4,16,0.3827,1,-0.9239,0.7071,1,-0.7071,0.7071,0,-0.7071,0.3827,0,-0.9239],
// 5 24 0.3827 0 -0.9239 0.3827 1 -0.9239 0.7071 0 -0.7071 0 0 -1
  [5,24,0.3827,0,-0.9239,0.3827,1,-0.9239,0.7071,0,-0.7071,0,0,-1],
// 4 16 0.7071 1 -0.7071 0.9239 1 -0.3827 0.9239 0 -0.3827 0.7071 0 -0.7071
  [4,16,0.7071,1,-0.7071,0.9239,1,-0.3827,0.9239,0,-0.3827,0.7071,0,-0.7071],
// 5 24 0.7071 0 -0.7071 0.7071 1 -0.7071 0.9239 0 -0.3827 0.3827 0 -0.9239
  [5,24,0.7071,0,-0.7071,0.7071,1,-0.7071,0.9239,0,-0.3827,0.3827,0,-0.9239],
// 4 16 0.9239 1 -0.3827 1 1 0 1 0 0 0.9239 0 -0.3827
  [4,16,0.9239,1,-0.3827,1,1,0,1,0,0,0.9239,0,-0.3827],
// 5 24 0.9239 0 -0.3827 0.9239 1 -0.3827 1 0 0 0.7071 0 -0.7071
  [5,24,0.9239,0,-0.3827,0.9239,1,-0.3827,1,0,0,0.7071,0,-0.7071],
// 0
];
module ldraw_lib__4_4cyli(step=0, col=false, unit=2/5, alt=false, line=0.2, solid=!$preview)
    makepoly(ldraw_lib__4_4cyli(solid), step=step, col=col, unit=unit, alt=alt, line=line, solid=solid);
ldraw_lib__4_4cyli(line=0.2);
// file: ../3004.scad
use <../lib.scad>
use <s/3004s01.scad>
$fa=1; $fs=0.2;
function ldraw_lib__3004(realsolid=false) = [
// 0 Brick  1 x  2
// 0 Name: 3004.dat
// 0 Author: James Jessiman
// 0 !LDRAW_ORG Part UPDATE 2022-05
// 0 !LICENSE Licensed under CC BY 2.0 and CC BY 4.0 : see CAreadme.txt
// 
// 0 BFC CERTIFY CCW
  [0,"BFC","CERTIFY"],
  [0,"BFC","CCW"],
// 
// 0 !HISTORY 2001-10-26 [PTadmin] Official Update 2001-01
// 0 !HISTORY 2002-05-07 {unknown} BFC Certification
// 0 !HISTORY 2002-06-11 [PTadmin] Official Update 2002-03
// 0 !HISTORY 2007-05-07 [PTadmin] Header formatted for Contributor Agreement
// 0 !HISTORY 2008-07-01 [PTadmin] Official Update 2008-01
// 0 !HISTORY 2022-08-04 [MagFors] Using subfile
// 0 !HISTORY 2022-09-15 [PTadmin] Official Update 2022-05
// 
// 
// 1 16 0 0 0 1 0 0 0 1 0 0 0 1 s\3004s01.dat
  [1,16,0,0,0,1,0,0,0,1,0,0,0,1, ldraw_lib__s__3004s01(realsolid)],
// 4 16 -20 24 -10 20 24 -10 20 0 -10 -20 0 -10
  [4,16,-20,24,-10,20,24,-10,20,0,-10,-20,0,-10],
];
module ldraw_lib__3004(step=0, col=false, unit=2/5, alt=false, line=0.2, solid=!$preview)
    makepoly(ldraw_lib__3004(solid), step=step, col=col, unit=unit, alt=alt, line=line, solid=solid);
ldraw_lib__3004(line=0.2);
// file: 735s01.scad
use <../../lib.scad>
use <../../p/4-4cyli.scad>
use <../../p/4-4disc.scad>
use <../../p/4-4edge.scad>
use <../../p/4-4rin13.scad>
use <../../p/4-4rin14.scad>
use <../u9044.scad>
$fa=1; $fs=0.2;
function ldraw_lib__s__735s01(realsolid=false) = [
// 0 ~Magnet Holder (Needs Work)
// 0 Name: s\735s01.dat
// 0 Author: Tore Eriksson [Tore_Eriksson]
// 0 !LDRAW_ORG Subpart UPDATE 2012-01
// 0 !LICENSE Licensed under CC BY 2.0 and CC BY 4.0 : see CAreadme.txt
// 
// 0 BFC CERTIFY CCW
  [0,"BFC","CERTIFY"],
  [0,"BFC","CCW"],
// 
// 0 !HISTORY 1999-12-31 [PTadmin] Official Update 1999-06
// 0 !HISTORY 2007-09-14 [PTadmin] Header formatted for Contributor Agreement
// 0 !HISTORY 2008-07-01 [PTadmin] Official Update 2008-01
// 0 !HISTORY 2008-07-07 [nielsk] BFC certified; ring6 fixed; size corrected
// 0 !HISTORY 2008-07-08 [PTadmin] Renamed from magnet
// 0 !HISTORY 2009-05-02 [PTadmin] Official Update 2009-01
// 0 !HISTORY 2011-12-18 [Steffen] added missing inside; used u9044.dat; used new magnet material 493; added needs work note
// 0 !HISTORY 2012-03-30 [PTadmin] Official Update 2012-01
// 
// 
// 0 // Needs Work: The parent files of this file need restructurization analogous
// 0 // to 499c01.dat, as currently the magnet is directly contained
// 0 // in this subfile, which does not conform with our parts/subparts
// 0 // /shortcuts logic.
// 
// 1 16 0 0 0 0 1 0 15 0 0 0 0 15 4-4edge.dat
  [1,16,0,0,0,0,1,0,15,0,0,0,0,15, ldraw_lib__4_4edge(realsolid)],
// 1 16 19 0 0 0 1 0 15 0 0 0 0 15 4-4edge.dat
  [1,16,19,0,0,0,1,0,15,0,0,0,0,15, ldraw_lib__4_4edge(realsolid)],
// 1 16 19 0 0 0 -1 0 1 0 0 0 0 1 4-4rin13.dat
  [1,16,19,0,0,0,-1,0,1,0,0,0,0,1, ldraw_lib__4_4rin13(realsolid)],
// 1 16 19 0 0 0 -1 0 1 0 0 0 0 1 4-4rin14.dat
  [1,16,19,0,0,0,-1,0,1,0,0,0,0,1, ldraw_lib__4_4rin14(realsolid)],
// 1 16 5 0 0 0 -1 0 13 0 0 0 0 -13 4-4disc.dat
  [1,16,5,0,0,0,-1,0,13,0,0,0,0,-13, ldraw_lib__4_4disc(realsolid)],
// 1 16 0 0 0 0 1 0 15 0 0 0 0 15 4-4disc.dat
  [1,16,0,0,0,0,1,0,15,0,0,0,0,15, ldraw_lib__4_4disc(realsolid)],
// 1 16 0 0 0 0 19 0 15 0 0 0 0 15 4-4cyli.dat
  [1,16,0,0,0,0,19,0,15,0,0,0,0,15, ldraw_lib__4_4cyli(realsolid)],
// 1 16 19 0 0 0 1 0 13 0 0 0 0 13 4-4edge.dat
  [1,16,19,0,0,0,1,0,13,0,0,0,0,13, ldraw_lib__4_4edge(realsolid)],
// 1 16 5 0 0 0 1 0 13 0 0 0 0 13 4-4edge.dat
  [1,16,5,0,0,0,1,0,13,0,0,0,0,13, ldraw_lib__4_4edge(realsolid)],
// 0 BFC INVERTNEXT
  [0,"BFC","INVERTNEXT"],
// 1 16 5 0 0 0 14 0 13 0 0 0 0 13 4-4cyli.dat
  [1,16,5,0,0,0,14,0,13,0,0,0,0,13, ldraw_lib__4_4cyli(realsolid)],
// 1 493 12.5 0 0 0 0 1 0 1 0 -1 0 0 u9044.dat
  [1,493,12.5,0,0,0,0,1,0,1,0,-1,0,0, ldraw_lib__u9044(realsolid)],
];
module ldraw_lib__s__735s01(step=0, col=false, unit=2/5, alt=false, line=0.2, solid=!$preview)
    makepoly(ldraw_lib__s__735s01(solid), step=step, col=col, unit=unit, alt=alt, line=line, solid=solid);
ldraw_lib__s__735s01(line=0.2);
// main file
use <../../lib.scad>
use <735s01.scad>
$fa=1; $fs=0.2;
function ldraw_lib__s__magnet(realsolid=false) = [
// 0 ~Moved to s\735s01
// 0 Name: s\magnet.dat
// 0 Author: [PTadmin]
// 0 !LDRAW_ORG Subpart UPDATE 2009-01
// 0 !LICENSE Licensed under CC BY 4.0 : see CAreadme.txt
// 
// 0 BFC CERTIFY CCW
  [0,"BFC","CERTIFY"],
  [0,"BFC","CCW"],
// 
// 0 !HISTORY 2009-05-02 [PTadmin] Official Update 2009-01
// 
// 
// 0 // ~Magnet Holder Old
// 
// 1 16 0 0 0 1 0 0 0 1 0 0 0 1 s\735s01.dat
  [1,16,0,0,0,1,0,0,0,1,0,0,0,1, ldraw_lib__s__735s01(realsolid)],
];
module ldraw_lib__s__magnet(step=0, col=false, unit=2/5, alt=false, line=0.2, solid=!$preview)
    makepoly(ldraw_lib__s__magnet(solid), step=step, col=col, unit=unit, alt=alt, line=line, solid=solid);
ldraw_lib__s__magnet(line=0.2);
